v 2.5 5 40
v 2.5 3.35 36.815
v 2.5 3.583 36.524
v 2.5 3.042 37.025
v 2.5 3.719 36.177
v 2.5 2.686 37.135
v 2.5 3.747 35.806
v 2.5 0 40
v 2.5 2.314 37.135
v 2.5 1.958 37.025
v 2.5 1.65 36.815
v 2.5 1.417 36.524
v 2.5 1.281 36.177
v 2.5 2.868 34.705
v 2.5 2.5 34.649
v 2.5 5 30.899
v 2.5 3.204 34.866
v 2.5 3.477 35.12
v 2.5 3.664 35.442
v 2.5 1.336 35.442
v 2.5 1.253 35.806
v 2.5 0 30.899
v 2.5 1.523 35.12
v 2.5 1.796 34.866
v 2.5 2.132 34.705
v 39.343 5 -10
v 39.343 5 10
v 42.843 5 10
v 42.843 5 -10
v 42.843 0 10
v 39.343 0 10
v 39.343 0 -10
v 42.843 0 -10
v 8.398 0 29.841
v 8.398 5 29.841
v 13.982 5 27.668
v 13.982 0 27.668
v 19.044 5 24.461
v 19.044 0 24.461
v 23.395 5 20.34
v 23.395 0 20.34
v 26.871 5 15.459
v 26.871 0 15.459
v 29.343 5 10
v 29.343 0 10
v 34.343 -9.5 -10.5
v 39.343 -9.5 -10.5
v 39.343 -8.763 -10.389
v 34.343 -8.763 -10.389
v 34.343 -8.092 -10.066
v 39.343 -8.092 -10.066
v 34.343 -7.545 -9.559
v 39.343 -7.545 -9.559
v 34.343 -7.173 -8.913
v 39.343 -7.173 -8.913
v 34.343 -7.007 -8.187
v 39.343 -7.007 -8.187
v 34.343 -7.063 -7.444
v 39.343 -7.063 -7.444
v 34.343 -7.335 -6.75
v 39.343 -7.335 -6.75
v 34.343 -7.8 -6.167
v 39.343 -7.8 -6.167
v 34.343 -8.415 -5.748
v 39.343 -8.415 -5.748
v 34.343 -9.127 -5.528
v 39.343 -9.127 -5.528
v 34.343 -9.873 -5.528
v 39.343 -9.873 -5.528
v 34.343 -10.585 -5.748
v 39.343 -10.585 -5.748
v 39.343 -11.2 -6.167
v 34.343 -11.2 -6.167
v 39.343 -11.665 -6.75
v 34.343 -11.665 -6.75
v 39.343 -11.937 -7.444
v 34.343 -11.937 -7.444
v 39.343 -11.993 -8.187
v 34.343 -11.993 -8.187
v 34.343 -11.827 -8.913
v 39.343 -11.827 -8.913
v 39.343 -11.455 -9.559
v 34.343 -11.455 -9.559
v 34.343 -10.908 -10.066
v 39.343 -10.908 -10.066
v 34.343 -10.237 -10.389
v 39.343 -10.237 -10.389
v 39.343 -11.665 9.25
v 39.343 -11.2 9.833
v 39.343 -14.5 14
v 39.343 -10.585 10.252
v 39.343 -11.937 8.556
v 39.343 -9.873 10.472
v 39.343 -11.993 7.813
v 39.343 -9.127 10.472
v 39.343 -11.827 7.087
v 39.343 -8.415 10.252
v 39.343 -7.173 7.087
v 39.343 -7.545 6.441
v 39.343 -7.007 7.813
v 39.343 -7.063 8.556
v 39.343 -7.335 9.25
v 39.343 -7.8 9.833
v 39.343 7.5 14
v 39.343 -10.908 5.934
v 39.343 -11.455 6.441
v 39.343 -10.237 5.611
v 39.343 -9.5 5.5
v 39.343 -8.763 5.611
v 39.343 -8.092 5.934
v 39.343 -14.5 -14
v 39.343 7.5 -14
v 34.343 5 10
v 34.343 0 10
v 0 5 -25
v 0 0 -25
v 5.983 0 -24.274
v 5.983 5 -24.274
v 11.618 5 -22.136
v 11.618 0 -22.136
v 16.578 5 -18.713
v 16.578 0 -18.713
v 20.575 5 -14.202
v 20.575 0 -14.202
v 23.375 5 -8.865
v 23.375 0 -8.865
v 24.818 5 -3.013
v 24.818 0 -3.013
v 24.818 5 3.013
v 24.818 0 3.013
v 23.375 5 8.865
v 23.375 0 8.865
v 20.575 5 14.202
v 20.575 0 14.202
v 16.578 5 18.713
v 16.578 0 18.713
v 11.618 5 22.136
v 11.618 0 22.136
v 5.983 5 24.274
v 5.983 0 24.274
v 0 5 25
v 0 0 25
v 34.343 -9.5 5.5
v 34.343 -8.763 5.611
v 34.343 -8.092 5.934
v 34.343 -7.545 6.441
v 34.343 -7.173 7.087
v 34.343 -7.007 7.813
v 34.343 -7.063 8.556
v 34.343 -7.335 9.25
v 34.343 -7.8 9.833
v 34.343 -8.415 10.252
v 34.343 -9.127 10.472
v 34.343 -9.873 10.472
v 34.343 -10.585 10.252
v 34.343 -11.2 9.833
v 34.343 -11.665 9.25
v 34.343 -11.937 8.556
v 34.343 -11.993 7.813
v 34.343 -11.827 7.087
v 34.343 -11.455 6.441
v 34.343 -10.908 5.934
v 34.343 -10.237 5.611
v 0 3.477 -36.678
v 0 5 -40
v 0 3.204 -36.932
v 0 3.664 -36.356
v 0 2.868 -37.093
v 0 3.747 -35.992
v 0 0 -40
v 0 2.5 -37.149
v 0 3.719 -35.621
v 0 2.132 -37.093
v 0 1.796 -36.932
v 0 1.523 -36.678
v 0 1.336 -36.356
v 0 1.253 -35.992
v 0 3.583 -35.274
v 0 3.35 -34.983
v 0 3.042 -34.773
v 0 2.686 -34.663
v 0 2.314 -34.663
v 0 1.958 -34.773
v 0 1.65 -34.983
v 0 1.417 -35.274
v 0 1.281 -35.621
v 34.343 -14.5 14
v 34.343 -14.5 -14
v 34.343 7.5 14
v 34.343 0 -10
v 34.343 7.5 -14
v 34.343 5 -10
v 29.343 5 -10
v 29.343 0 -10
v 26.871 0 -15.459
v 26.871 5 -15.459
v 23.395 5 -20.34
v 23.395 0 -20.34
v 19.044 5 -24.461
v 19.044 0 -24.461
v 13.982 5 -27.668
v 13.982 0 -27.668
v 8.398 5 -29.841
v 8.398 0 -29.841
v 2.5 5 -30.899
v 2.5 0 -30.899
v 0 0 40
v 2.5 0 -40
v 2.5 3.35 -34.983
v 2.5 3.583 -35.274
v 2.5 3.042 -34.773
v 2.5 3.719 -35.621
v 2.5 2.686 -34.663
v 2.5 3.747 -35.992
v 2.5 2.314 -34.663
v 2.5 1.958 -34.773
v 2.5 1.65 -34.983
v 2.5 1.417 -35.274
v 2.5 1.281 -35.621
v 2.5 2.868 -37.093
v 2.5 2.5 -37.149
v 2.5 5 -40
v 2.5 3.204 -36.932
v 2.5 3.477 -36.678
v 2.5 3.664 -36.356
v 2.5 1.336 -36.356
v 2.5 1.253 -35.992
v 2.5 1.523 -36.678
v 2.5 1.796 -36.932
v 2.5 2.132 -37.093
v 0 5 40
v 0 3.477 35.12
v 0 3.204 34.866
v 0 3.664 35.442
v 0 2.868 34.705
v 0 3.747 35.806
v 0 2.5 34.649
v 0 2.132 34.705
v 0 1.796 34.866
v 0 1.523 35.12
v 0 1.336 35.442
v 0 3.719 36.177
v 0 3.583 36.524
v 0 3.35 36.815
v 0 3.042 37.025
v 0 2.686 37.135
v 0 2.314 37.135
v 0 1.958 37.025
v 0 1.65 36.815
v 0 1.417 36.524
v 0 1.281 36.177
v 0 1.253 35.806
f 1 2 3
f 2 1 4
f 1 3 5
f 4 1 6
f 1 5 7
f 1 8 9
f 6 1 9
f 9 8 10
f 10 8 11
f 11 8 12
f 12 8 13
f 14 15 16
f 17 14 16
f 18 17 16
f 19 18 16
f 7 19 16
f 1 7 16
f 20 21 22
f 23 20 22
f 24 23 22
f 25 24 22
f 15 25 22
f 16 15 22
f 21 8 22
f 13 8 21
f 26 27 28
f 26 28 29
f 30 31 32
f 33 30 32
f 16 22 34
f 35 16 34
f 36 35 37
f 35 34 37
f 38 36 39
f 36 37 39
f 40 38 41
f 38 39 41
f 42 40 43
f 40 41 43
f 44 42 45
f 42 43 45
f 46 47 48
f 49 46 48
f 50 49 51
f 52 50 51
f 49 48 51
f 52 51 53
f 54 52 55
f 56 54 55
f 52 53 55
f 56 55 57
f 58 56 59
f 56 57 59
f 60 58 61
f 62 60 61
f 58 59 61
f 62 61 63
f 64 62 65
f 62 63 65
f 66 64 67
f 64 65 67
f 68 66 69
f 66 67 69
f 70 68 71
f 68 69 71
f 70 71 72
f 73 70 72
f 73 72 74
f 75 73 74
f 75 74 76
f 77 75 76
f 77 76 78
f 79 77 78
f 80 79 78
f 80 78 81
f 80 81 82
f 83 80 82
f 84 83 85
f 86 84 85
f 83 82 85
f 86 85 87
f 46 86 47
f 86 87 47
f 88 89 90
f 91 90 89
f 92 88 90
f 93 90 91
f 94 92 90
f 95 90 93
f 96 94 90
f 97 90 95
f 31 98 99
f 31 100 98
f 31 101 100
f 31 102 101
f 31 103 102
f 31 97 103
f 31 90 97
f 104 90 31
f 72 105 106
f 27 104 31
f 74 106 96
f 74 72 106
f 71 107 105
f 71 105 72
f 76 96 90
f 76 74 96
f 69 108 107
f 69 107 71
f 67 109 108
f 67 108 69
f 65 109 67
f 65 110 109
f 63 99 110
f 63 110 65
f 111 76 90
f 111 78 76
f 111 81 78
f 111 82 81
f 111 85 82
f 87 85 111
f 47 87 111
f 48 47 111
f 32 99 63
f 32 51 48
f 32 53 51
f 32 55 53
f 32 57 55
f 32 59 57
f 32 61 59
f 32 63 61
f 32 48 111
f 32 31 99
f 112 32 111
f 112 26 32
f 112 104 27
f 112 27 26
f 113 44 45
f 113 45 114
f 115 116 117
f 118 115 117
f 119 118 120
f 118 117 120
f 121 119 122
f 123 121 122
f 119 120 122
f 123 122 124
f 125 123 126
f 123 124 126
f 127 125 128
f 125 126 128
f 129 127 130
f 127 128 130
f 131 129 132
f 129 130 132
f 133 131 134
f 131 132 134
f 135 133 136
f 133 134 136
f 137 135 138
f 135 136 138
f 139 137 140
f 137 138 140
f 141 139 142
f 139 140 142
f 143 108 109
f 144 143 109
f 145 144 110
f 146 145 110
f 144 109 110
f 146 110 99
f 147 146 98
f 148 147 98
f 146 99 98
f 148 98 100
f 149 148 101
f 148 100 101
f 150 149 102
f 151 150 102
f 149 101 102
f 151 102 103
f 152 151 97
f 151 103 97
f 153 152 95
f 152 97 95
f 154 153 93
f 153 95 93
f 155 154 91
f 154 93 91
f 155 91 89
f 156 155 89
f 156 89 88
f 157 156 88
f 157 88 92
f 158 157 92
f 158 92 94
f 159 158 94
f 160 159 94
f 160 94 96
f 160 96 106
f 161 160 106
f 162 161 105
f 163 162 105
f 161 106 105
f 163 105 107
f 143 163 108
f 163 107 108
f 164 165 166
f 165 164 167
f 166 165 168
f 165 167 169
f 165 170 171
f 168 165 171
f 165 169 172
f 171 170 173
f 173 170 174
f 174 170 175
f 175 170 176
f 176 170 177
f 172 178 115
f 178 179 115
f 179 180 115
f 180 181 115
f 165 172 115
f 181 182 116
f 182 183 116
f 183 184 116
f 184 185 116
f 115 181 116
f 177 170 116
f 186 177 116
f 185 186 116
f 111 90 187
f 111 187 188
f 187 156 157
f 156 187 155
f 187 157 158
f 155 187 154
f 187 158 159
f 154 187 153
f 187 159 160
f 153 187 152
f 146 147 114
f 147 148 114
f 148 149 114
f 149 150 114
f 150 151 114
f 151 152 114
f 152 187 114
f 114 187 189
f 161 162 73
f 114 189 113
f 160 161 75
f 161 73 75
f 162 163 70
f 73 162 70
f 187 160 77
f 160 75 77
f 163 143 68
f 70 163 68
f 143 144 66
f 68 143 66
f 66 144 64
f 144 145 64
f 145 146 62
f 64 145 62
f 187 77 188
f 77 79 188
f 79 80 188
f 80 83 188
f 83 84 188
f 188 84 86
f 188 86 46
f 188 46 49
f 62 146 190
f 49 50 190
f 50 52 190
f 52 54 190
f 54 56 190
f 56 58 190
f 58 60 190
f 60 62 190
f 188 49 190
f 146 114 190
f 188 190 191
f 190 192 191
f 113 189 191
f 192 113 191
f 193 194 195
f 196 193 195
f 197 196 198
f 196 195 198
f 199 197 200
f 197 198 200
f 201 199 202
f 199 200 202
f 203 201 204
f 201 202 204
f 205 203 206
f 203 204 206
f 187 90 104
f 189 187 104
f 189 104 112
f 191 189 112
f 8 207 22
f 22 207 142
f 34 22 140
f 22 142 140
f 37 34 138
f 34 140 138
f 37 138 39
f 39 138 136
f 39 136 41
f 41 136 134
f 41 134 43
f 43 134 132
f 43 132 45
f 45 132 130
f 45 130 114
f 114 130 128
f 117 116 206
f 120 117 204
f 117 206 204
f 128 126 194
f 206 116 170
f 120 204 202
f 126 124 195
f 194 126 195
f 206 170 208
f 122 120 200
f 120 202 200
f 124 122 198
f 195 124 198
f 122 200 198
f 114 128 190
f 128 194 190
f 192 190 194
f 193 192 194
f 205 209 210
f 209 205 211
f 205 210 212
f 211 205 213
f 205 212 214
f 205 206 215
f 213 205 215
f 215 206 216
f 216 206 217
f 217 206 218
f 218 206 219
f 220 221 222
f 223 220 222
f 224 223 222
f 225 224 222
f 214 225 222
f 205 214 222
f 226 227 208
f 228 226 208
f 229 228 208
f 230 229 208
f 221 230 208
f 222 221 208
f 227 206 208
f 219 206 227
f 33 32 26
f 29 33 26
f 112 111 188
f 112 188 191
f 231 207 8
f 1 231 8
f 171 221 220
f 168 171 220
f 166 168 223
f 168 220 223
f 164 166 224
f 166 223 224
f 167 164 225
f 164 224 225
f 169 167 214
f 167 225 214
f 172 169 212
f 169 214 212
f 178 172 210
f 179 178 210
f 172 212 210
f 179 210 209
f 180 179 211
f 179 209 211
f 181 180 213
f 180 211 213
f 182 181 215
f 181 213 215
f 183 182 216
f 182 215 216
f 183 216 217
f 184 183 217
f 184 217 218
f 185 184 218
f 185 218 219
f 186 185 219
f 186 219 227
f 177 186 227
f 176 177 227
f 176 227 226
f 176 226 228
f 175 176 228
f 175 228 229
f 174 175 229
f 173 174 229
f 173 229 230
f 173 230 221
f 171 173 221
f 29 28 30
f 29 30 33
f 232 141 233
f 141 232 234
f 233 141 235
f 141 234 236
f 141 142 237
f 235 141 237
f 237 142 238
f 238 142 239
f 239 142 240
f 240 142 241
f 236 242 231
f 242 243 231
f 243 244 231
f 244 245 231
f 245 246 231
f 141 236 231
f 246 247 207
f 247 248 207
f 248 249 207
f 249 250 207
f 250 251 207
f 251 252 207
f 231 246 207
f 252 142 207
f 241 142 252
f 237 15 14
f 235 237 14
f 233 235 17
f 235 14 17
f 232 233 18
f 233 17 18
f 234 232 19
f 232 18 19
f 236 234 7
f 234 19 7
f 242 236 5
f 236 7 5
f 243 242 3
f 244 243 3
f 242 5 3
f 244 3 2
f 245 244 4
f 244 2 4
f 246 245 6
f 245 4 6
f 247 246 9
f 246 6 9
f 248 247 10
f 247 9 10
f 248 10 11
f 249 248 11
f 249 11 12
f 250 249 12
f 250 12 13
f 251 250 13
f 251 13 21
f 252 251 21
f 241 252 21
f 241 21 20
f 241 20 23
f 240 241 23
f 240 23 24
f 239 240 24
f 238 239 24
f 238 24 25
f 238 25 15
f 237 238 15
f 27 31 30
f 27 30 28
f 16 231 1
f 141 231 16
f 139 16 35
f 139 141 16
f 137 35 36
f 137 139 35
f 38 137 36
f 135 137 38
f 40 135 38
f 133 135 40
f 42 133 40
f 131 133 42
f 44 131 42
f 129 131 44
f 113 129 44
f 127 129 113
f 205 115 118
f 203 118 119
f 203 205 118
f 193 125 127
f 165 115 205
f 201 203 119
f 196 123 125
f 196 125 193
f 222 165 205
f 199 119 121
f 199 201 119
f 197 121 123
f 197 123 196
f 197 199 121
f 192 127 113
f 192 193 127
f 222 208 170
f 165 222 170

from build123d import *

# Parameters (mm, degrees)
BOSS_EXTRUDE1_DEPTH = 5
SKETCH4_W           = 28
SKETCH4_H           = 22
SKETCH4_R           = 2.5
BOSS_EXTRUDE3_DEPTH = 5
SKETCH6_W           = 20
SKETCH6_H           = 5
BOSS_EXTRUDE4_DEPTH = 3.5
SKETCH8_R           = 1.25
CUT_EXTRUDE1_DEPTH  = 3.5


with BuildPart() as part:
    # Sketch1 → Boss-Extrude1 (new body)
    with BuildSketch(Plane(origin=(0, 0, 0), x_dir=(1, 0, 0), z_dir=(0, 1, 0))):
        with BuildLine():
            Line((0, -25), (0, -40))
            Line((0, -40), (2.5, -40))
            Line((2.5, -40), (2.5, -30.899029111))
            ThreePointArc((2.5, -30.899029111), (19.044247329, -24.460511926), (29.342801502, -10))
            Line((29.342801502, -10), (39.342801502, -10))
            Line((39.342801502, -10), (39.342801502, 10))
            Line((39.342801502, 10), (29.342801502, 10))
            ThreePointArc((29.342801502, 10), (19.044247329, 24.460511926), (2.5, 30.899029111))
            Line((2.5, 30.899029111), (2.5, 40))
            Line((2.5, 40), (0, 40))
            Line((0, 40), (0, 25))
            ThreePointArc((0, 25), (25, 0), (0, -25))
        make_face()
    extrude(amount=BOSS_EXTRUDE1_DEPTH)

    # Sketch4 → Boss-Extrude3 (add)
    with BuildSketch(Plane(origin=(39.342801502, 0, 0), x_dir=(0, 0, -1), z_dir=(1, 0, 0))):
        with Locations((0, -3.5)):
            Rectangle(SKETCH4_W, SKETCH4_H)
        with Locations((8, -9.5)):
            Circle(SKETCH4_R, mode=Mode.SUBTRACT)
        with Locations((-8, -9.5)):
            Circle(SKETCH4_R, mode=Mode.SUBTRACT)
    extrude(amount=-BOSS_EXTRUDE3_DEPTH)

    # Sketch6 → Boss-Extrude4 (add)
    with BuildSketch(Plane(origin=(39.342801502, 0, 0), x_dir=(0, 0, -1), z_dir=(1, 0, 0))):
        with Locations((0, 2.5)):
            Rectangle(SKETCH6_W, SKETCH6_H)
    extrude(amount=BOSS_EXTRUDE4_DEPTH)

    # Sketch8 → Cut-Extrude1 (cut, through all)
    with BuildSketch(Plane(origin=(2.5, 0, 0), x_dir=(0, 0, -1), z_dir=(1, 0, 0))):
        with Locations((-35.899029111, 2.5)):
            Circle(SKETCH8_R)
        with Locations((35.899029111, 2.5)):
            Circle(SKETCH8_R)
    extrude(amount=-CUT_EXTRUDE1_DEPTH, mode=Mode.SUBTRACT)


solid = part.part
